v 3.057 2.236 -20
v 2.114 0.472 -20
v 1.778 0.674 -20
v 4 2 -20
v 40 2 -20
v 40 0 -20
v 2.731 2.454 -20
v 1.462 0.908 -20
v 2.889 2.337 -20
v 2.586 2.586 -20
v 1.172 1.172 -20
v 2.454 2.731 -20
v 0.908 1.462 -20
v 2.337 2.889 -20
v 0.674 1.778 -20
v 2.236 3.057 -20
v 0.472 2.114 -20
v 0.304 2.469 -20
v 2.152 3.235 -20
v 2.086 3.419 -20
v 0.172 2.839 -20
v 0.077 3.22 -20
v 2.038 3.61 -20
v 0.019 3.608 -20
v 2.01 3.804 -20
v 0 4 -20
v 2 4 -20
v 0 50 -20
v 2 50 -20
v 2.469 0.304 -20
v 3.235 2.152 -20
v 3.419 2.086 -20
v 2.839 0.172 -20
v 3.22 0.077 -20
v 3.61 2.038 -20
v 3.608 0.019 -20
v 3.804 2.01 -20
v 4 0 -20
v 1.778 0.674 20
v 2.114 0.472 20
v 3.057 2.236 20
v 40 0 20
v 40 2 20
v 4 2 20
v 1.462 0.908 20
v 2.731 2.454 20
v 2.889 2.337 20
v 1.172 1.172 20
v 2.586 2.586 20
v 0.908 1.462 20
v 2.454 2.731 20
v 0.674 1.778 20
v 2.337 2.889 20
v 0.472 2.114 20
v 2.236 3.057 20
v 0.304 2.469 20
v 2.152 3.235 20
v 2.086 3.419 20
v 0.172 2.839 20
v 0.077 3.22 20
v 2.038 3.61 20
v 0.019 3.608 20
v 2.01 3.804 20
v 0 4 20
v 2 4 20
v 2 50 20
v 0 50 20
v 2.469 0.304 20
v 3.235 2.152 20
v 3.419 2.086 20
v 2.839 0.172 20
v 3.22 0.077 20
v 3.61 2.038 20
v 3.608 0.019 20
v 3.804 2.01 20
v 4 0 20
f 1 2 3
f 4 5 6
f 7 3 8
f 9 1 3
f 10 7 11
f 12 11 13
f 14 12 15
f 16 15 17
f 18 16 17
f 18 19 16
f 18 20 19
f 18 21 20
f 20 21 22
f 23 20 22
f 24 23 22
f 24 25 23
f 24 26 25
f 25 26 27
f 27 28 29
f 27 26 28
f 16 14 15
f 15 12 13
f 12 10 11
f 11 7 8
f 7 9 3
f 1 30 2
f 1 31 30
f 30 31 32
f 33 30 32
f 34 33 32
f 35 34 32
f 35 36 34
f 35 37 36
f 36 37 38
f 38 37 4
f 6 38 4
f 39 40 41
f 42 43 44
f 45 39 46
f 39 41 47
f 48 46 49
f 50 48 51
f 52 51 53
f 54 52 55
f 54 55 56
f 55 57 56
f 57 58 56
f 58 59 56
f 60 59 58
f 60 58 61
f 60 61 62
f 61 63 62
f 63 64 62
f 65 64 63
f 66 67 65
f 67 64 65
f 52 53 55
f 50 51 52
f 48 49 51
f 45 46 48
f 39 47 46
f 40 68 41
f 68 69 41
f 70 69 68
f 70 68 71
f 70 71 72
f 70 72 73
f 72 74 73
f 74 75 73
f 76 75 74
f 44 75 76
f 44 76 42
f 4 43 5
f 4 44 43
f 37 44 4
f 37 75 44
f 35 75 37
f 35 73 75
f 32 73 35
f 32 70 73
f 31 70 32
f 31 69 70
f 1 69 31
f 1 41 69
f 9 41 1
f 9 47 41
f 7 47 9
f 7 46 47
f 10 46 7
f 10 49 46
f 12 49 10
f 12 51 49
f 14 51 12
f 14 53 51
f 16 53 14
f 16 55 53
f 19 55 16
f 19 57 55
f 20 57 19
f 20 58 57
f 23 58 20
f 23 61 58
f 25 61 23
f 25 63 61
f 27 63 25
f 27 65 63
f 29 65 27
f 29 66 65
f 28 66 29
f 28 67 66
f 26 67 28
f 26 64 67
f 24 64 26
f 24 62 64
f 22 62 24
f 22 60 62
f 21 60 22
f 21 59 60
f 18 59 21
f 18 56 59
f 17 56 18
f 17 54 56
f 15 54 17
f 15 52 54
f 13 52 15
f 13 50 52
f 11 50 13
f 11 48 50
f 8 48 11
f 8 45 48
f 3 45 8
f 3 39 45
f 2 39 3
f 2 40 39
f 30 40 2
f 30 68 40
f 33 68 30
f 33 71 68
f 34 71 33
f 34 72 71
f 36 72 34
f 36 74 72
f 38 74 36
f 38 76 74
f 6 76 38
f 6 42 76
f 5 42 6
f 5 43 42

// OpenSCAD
// OpenSCAD Sheet-Metal L-Bracket Design
// Parameters
thickness = 2.0;       // Sheet metal thickness (mm)
bend_radius = 2.0;     // Inside bend radius (mm)
k_factor = 0.45;       // K-factor for bend allowance
flange1_out = 50.0;    // Outside length of flange 1 (mm)
flange2_out = 40.0;    // Outside length of flange 2 (mm)
width = 40.0;          // Bracket width (mm)

// Number of fragments for circular arcs
$fn = 64;

// Math calculations for flat pattern blank length
angle = 90;            // Bend angle in degrees
r_out = bend_radius + thickness; // Outside bend radius

// Flat length segments
flange1_flat = flange1_out - r_out;
flange2_flat = flange2_out - r_out;

// Bend Allowance (BA) formula
ba = (PI * angle / 180) * (bend_radius + k_factor * thickness);
flat_length = flange1_flat + flange2_flat + ba;

// Echo manifest for DFM validation
echo(str("MAKERBENCH-SHEETMETAL: {\"thickness_mm\": ", thickness, ", \"bend_radius_mm\": ", bend_radius, ", \"flat_length_mm\": ", flat_length, "}"));

// 2D Profile Generation
cx = r_out;
cy = r_out;
steps = $fn / 4; // 90 degree quadrant

// Inside bend arc points (180 to 270 degrees)
inside_arc = [ for (i = [0 : steps]) 
    let(a = 180 + 90 * i / steps)
    [cx + bend_radius * cos(a), cy + bend_radius * sin(a)]
];

// Outside bend arc points (270 down to 180 degrees)
outside_arc = [ for (i = [0 : steps]) 
    let(a = 270 - 90 * i / steps)
    [cx + r_out * cos(a), cy + r_out * sin(a)]
];

// Complete 2D profile polygon path
profile_points = concat(
    [[0, flange1_out]],          // Flange 1 outer end
    [[thickness, flange1_out]],  // Flange 1 inner end
    inside_arc,                  // Inner bend transition
    [[flange2_out, thickness]],  // Flange 2 inner end
    [[flange2_out, 0]],          // Flange 2 outer end
    outside_arc                  // Outer bend transition
);

// 3D Solid Generation
linear_extrude(height = width, center = true) {
    polygon(profile_points);
}
